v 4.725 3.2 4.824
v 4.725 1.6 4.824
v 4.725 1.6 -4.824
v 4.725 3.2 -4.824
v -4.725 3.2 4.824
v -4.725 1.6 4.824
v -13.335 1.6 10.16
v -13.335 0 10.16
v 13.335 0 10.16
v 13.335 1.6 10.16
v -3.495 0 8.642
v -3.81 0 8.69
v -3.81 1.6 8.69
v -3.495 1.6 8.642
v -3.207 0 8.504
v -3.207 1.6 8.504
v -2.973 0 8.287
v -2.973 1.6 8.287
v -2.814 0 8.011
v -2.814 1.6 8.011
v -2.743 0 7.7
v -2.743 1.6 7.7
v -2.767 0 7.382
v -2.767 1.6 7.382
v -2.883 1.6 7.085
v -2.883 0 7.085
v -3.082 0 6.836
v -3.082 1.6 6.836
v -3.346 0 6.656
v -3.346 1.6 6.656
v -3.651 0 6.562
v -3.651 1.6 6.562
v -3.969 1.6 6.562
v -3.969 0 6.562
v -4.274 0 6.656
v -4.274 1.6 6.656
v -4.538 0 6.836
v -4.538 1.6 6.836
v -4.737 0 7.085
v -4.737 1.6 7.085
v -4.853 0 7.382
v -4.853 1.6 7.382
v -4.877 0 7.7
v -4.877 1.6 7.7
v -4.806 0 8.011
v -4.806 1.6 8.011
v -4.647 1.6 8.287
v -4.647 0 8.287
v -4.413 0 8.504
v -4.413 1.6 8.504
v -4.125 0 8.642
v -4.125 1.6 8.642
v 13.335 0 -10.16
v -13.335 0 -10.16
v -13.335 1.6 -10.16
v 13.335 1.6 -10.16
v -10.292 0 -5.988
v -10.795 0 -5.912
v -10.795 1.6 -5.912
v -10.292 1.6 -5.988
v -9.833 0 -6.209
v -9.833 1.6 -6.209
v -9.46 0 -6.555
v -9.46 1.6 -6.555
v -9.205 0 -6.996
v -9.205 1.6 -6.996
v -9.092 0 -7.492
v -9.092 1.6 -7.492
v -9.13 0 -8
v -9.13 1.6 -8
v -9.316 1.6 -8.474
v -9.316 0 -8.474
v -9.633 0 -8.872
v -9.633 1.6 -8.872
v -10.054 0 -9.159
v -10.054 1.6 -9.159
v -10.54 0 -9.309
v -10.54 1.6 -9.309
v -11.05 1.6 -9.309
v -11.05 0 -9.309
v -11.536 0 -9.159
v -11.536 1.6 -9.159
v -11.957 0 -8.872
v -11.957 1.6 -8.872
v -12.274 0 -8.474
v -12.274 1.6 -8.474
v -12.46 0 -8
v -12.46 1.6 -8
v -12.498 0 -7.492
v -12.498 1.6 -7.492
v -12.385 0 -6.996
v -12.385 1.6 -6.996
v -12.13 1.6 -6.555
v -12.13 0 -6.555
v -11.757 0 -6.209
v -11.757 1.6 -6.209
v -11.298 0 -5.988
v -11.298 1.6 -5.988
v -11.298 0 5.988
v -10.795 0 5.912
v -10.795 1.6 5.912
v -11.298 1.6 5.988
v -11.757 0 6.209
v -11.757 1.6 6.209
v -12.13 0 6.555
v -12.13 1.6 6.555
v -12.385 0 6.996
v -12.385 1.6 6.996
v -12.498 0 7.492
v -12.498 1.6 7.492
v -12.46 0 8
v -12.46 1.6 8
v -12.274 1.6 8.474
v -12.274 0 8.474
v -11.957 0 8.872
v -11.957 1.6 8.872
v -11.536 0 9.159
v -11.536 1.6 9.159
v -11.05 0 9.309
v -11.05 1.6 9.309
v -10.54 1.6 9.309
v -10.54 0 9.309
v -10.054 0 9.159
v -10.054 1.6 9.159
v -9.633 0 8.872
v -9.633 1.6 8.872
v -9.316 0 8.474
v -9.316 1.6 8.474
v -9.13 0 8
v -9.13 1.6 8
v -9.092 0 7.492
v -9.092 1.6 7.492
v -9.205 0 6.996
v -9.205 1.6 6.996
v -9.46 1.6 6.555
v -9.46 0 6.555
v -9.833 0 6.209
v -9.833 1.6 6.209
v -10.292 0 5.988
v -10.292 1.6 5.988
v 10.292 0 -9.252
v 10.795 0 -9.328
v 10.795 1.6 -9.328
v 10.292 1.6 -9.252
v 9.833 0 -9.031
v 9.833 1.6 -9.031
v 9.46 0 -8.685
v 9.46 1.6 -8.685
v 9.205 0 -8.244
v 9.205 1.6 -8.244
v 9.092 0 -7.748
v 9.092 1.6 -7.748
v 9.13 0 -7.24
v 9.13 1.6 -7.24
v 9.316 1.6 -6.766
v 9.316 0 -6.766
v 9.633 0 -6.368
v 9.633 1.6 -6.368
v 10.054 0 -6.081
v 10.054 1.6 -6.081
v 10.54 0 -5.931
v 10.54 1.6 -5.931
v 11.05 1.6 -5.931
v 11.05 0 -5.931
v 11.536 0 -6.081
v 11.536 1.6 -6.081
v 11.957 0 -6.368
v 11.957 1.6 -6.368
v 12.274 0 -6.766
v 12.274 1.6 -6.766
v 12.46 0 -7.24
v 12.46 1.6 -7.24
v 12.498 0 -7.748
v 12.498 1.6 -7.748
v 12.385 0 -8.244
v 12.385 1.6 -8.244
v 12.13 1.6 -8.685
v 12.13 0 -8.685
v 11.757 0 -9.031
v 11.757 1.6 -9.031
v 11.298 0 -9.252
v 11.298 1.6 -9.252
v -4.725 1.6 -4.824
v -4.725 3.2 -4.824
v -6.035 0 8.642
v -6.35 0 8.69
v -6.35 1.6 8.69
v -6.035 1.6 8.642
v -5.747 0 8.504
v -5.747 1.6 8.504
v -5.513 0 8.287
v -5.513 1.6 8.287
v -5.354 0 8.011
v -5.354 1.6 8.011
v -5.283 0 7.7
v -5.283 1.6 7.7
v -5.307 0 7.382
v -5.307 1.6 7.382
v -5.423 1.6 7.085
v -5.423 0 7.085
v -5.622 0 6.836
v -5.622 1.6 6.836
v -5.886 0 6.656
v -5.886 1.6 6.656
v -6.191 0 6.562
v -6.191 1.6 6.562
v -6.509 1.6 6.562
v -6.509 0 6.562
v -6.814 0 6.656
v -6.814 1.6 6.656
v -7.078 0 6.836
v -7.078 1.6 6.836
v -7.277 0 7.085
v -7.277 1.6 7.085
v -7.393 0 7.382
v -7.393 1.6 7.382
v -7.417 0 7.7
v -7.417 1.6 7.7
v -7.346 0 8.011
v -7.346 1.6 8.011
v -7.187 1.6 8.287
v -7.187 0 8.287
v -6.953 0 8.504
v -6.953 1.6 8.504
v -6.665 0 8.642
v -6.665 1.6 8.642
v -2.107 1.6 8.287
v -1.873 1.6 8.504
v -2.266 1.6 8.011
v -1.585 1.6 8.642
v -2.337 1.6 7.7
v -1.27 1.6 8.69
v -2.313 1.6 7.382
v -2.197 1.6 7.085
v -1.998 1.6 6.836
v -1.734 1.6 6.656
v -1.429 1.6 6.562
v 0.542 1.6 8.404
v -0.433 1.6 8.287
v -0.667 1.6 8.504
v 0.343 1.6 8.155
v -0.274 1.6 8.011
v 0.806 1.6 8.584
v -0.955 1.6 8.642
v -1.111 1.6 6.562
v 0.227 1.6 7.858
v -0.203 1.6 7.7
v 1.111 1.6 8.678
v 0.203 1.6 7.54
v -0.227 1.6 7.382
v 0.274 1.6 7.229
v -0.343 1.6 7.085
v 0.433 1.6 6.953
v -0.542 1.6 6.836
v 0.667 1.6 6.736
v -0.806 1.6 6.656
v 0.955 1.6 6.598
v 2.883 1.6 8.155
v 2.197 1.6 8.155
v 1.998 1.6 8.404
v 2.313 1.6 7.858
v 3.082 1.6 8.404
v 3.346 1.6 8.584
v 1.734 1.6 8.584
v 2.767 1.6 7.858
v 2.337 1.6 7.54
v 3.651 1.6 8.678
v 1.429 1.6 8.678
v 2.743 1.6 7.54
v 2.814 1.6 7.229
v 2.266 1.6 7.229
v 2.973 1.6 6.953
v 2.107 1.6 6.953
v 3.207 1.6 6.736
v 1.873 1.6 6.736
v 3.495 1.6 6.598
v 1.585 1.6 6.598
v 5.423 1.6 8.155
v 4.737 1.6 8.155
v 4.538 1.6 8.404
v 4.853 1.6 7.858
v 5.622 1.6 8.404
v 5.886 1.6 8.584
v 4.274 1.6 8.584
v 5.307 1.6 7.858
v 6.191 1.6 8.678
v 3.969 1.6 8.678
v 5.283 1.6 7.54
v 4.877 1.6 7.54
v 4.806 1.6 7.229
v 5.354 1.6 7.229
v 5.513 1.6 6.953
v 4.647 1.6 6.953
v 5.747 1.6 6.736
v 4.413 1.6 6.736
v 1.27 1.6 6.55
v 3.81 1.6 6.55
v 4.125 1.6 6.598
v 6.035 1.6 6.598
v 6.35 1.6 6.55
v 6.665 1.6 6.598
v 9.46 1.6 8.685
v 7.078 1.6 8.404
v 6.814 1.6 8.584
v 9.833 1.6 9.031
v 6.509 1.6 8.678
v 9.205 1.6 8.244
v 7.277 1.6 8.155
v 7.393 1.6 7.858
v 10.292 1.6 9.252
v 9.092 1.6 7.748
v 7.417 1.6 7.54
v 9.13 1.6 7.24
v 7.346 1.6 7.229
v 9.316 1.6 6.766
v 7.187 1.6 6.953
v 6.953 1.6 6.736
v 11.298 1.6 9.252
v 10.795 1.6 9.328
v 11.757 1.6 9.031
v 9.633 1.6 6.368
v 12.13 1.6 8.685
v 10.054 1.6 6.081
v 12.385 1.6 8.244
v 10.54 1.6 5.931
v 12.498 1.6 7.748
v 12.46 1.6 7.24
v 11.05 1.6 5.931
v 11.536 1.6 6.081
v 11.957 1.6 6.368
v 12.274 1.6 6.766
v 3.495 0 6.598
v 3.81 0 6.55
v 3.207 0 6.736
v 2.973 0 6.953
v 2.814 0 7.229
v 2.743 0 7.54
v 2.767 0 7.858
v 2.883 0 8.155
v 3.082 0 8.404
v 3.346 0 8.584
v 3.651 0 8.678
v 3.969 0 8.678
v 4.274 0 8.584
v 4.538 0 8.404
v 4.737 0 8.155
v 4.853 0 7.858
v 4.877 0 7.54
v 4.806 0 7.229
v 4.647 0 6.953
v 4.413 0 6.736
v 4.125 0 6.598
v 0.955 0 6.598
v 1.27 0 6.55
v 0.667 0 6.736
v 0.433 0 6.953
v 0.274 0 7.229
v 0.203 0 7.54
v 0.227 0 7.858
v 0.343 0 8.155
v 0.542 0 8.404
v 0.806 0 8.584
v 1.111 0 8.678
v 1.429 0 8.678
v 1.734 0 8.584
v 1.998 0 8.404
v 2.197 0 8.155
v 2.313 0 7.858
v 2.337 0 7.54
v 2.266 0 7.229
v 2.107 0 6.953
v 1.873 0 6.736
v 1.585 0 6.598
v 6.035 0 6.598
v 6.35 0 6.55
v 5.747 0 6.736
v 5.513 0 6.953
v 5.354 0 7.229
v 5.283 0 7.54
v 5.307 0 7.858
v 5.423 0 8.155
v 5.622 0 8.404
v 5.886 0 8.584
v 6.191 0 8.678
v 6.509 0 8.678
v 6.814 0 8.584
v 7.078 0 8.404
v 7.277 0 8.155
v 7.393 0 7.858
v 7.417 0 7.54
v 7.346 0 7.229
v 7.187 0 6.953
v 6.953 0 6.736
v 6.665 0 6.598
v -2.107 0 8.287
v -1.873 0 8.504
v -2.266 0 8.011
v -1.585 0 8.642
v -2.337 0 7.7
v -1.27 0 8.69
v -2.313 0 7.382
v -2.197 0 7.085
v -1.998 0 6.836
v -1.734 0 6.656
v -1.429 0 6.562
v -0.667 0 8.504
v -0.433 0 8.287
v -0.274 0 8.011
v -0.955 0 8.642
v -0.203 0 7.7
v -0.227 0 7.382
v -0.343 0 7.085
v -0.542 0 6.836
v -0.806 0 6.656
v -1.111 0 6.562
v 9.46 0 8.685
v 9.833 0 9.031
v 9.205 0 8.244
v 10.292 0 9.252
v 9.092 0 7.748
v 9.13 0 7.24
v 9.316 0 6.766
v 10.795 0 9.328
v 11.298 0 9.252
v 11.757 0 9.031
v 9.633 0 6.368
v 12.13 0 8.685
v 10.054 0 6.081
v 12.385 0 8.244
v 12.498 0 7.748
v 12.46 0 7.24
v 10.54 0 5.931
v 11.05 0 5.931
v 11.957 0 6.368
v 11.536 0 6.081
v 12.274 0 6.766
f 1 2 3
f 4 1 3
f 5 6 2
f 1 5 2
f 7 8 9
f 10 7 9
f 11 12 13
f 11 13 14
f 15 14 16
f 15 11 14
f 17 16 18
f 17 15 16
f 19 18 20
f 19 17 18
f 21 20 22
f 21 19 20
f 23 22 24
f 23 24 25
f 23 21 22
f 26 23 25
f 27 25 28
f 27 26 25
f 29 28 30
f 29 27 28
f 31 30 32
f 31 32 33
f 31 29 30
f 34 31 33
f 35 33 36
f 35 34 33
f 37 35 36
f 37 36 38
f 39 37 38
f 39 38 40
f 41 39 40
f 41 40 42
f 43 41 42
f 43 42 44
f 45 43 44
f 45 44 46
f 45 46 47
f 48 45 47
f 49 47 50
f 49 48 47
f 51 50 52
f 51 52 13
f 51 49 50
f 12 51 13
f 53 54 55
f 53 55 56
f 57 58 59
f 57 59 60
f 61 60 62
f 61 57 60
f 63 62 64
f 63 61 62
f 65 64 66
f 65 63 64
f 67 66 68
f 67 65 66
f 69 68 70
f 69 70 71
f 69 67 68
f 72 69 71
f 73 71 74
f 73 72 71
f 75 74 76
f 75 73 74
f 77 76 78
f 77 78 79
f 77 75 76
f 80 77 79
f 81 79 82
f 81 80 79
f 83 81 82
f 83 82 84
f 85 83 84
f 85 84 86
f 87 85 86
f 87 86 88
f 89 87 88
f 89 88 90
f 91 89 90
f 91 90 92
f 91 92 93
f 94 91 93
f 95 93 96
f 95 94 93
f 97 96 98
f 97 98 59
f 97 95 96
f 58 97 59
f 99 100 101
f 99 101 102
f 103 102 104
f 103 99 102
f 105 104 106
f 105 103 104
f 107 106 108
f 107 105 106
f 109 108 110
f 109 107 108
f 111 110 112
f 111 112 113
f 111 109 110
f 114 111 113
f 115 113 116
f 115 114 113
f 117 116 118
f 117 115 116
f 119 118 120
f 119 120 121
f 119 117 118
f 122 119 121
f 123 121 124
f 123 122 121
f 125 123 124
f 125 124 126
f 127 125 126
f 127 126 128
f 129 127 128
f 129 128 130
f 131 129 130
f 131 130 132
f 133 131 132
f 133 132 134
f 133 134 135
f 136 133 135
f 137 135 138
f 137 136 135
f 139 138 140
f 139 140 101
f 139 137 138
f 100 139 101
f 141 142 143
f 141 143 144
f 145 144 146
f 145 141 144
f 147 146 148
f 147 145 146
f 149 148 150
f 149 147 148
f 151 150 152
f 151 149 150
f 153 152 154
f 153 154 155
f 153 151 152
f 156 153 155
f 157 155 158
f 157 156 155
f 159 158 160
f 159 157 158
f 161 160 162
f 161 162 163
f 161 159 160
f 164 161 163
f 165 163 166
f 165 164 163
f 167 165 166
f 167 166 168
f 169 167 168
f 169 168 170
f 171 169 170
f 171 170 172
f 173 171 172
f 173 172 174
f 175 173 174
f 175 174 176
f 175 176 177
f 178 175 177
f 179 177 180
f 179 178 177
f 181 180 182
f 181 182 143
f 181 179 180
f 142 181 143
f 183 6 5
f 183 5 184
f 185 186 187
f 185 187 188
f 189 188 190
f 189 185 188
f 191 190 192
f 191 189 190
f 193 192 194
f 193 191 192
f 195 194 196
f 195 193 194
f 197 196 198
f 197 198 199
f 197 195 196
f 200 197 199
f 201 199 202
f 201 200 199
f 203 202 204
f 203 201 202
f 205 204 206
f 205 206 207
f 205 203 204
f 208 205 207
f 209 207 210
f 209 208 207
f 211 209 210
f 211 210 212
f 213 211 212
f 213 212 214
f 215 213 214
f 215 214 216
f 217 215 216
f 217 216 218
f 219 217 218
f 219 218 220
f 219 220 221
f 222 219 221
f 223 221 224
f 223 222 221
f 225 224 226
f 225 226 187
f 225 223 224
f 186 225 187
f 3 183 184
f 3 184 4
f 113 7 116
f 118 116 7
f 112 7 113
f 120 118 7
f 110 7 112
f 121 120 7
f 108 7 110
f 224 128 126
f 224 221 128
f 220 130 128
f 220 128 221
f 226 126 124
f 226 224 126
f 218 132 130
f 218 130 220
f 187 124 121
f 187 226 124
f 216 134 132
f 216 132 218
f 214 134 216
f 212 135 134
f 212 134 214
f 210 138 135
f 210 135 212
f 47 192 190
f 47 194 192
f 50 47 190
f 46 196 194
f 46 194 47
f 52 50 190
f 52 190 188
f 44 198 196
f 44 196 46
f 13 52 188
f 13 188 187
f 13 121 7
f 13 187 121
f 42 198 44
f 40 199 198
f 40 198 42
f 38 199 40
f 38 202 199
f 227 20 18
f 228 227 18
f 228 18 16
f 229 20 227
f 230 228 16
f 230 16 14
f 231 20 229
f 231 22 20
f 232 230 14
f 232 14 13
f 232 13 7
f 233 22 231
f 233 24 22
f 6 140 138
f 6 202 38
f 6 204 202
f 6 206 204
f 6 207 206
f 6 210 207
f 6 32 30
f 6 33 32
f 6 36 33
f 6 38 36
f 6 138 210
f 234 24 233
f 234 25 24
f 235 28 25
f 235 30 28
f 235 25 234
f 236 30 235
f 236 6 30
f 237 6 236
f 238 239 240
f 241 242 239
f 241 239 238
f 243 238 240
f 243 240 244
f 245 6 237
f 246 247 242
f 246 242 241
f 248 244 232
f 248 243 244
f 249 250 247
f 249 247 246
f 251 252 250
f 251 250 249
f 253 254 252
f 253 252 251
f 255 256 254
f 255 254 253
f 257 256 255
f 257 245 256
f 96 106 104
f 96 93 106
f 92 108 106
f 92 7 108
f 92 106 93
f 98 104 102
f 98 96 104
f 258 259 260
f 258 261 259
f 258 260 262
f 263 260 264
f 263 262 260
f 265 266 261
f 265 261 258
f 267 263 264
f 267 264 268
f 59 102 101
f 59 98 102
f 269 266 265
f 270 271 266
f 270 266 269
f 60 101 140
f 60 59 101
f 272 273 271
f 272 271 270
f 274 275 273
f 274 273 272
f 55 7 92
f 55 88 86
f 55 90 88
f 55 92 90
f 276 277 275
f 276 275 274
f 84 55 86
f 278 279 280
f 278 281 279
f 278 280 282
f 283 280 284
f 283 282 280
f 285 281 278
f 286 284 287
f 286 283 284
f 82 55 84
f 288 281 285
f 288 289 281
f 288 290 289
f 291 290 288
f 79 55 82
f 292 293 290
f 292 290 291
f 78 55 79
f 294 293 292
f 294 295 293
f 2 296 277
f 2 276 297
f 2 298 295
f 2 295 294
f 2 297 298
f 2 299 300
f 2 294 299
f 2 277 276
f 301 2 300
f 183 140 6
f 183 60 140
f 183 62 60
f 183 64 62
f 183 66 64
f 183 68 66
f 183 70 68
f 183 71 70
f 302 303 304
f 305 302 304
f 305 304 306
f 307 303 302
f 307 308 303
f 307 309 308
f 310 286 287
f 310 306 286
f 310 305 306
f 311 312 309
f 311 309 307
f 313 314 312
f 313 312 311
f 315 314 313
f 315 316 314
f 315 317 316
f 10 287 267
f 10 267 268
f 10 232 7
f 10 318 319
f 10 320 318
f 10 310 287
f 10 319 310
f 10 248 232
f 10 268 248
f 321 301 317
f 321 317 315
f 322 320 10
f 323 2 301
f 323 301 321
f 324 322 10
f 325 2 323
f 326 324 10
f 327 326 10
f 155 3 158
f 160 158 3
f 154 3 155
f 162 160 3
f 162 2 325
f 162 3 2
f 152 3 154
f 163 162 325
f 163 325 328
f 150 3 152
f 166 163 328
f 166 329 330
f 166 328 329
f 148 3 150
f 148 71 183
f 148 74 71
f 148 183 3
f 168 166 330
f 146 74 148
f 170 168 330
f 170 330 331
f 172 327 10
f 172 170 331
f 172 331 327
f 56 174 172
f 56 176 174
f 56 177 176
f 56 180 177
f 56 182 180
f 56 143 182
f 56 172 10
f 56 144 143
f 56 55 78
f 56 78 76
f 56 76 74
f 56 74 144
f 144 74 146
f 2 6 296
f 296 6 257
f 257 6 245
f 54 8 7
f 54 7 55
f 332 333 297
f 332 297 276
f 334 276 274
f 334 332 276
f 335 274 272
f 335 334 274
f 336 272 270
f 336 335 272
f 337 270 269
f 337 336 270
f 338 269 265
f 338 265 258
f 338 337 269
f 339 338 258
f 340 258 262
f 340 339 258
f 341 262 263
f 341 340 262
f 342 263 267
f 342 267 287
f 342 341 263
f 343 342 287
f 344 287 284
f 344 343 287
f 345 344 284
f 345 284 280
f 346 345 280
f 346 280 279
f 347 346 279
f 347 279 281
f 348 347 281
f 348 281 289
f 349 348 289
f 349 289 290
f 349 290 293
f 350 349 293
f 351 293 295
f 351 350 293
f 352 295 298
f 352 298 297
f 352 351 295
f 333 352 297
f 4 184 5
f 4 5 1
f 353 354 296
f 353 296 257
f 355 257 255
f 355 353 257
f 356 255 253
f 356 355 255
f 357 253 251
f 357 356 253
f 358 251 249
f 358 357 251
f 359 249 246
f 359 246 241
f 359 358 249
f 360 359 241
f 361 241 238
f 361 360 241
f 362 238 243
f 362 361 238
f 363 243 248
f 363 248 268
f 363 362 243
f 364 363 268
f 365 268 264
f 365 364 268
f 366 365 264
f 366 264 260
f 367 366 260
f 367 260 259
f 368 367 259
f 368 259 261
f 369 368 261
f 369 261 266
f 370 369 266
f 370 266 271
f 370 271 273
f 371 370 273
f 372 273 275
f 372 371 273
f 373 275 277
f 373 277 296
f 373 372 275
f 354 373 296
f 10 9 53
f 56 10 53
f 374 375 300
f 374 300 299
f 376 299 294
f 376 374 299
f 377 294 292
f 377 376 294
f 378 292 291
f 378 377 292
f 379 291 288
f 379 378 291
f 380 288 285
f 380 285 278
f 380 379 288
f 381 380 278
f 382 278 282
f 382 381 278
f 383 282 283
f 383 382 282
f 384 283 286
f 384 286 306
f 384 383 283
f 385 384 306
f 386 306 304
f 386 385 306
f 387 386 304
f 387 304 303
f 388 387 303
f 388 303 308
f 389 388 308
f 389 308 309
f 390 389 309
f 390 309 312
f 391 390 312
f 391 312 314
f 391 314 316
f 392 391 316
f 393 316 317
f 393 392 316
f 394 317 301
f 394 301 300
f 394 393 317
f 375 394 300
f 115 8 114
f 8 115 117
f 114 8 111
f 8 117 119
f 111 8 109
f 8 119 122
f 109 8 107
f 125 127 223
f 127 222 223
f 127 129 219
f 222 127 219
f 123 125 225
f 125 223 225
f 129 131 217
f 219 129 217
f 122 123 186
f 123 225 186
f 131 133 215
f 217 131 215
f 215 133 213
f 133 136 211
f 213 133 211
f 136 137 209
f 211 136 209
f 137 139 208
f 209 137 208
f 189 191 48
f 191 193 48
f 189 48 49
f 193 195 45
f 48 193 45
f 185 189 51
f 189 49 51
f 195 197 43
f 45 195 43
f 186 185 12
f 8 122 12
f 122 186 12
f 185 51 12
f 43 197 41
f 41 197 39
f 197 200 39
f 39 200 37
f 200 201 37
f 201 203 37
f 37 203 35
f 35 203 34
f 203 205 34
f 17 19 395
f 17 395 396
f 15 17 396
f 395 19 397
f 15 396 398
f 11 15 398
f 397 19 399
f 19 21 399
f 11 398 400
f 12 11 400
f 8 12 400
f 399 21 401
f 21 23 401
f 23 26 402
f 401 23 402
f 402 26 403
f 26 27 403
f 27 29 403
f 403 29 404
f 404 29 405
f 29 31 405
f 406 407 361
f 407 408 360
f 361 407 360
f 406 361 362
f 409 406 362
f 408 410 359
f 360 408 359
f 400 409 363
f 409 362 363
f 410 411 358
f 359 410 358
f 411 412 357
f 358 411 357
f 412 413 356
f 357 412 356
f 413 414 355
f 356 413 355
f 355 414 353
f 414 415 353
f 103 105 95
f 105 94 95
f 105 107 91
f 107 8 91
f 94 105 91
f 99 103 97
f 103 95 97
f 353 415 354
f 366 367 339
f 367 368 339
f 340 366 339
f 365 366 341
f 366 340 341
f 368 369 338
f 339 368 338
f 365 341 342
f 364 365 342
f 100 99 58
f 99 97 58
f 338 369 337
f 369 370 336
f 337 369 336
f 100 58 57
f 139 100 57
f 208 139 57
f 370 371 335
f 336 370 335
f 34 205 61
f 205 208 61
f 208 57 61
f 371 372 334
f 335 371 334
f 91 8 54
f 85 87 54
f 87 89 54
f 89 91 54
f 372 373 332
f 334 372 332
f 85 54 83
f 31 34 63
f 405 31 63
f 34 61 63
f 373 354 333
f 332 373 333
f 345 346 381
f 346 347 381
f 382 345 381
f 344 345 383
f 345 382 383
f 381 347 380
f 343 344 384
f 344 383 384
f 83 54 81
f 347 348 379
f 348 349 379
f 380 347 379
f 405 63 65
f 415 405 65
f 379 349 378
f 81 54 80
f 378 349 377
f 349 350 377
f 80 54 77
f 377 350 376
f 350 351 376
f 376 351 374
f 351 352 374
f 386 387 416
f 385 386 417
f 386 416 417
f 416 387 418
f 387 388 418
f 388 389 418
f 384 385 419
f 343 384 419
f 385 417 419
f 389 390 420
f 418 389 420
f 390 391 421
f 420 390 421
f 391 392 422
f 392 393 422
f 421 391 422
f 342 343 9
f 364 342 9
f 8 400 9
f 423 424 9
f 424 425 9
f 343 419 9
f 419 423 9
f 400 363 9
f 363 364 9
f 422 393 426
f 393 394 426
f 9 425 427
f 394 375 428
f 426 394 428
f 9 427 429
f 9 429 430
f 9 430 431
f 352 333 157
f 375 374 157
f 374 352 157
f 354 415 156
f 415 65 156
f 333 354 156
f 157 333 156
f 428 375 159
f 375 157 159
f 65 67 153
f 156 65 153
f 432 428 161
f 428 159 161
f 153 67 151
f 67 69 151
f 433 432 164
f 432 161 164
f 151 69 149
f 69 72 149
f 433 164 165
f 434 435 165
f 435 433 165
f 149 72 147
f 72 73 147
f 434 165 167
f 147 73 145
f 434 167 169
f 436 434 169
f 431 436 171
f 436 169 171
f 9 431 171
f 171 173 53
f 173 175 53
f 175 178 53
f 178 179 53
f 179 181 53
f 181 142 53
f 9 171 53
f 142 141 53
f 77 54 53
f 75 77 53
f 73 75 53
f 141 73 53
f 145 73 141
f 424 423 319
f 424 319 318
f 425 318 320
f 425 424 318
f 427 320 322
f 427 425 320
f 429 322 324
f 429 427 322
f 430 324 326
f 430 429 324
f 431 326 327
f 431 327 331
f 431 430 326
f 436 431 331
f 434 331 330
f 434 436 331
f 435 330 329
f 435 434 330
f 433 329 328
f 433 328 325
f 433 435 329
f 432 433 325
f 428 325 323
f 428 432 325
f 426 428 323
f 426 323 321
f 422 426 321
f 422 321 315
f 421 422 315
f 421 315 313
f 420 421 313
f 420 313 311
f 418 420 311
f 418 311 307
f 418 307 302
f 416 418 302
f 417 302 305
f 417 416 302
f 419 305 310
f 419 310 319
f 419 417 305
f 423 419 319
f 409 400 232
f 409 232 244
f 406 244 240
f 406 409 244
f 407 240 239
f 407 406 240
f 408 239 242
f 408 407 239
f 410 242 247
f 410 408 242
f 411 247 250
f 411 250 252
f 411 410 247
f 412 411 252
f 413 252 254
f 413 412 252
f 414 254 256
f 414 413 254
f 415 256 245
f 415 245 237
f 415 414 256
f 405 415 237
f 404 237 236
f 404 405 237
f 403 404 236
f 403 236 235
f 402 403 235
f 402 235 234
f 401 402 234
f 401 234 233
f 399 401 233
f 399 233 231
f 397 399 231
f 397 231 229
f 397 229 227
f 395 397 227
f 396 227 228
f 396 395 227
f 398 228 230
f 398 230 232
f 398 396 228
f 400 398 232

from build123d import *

# Parameters (mm, degrees)
SKETCH1_W           = 26.67
SKETCH1_H           = 20.32
SKETCH1_R           = 1.707818092
SKETCH1_R_2         = 1.06997981
BOSS_EXTRUDE1_DEPTH = 1.6
SKETCH2_W           = 9.449727346
SKETCH2_H           = 9.64726846
BOSS_EXTRUDE2_DEPTH = 1.6


with BuildPart() as part:
    # Sketch1 → Boss-Extrude1 (new body)
    with BuildSketch(Plane(origin=(0, 0, 0), x_dir=(1, 0, 0), z_dir=(0, 1, 0))):
        Rectangle(SKETCH1_W, SKETCH1_H)
        with Locations(Location((-10.795, 7.62, 0), (0, 0, 270))):
            Circle(SKETCH1_R, mode=Mode.SUBTRACT)
        with Locations(Location((10.795, 7.62, 0), (0, 0, 90))):
            Circle(SKETCH1_R, mode=Mode.SUBTRACT)
        with Locations(Location((10.795, -7.62, 0), (0, 0, 270))):
            Circle(SKETCH1_R, mode=Mode.SUBTRACT)
        with Locations(Location((-10.795, -7.62, 0), (0, 0, 90))):
            Circle(SKETCH1_R, mode=Mode.SUBTRACT)
        with Locations(Location((-1.27, -7.62, 0), (0, 0, 270))):
            Circle(SKETCH1_R_2, mode=Mode.SUBTRACT)
        with Locations(Location((-3.81, -7.62, 0), (0, 0, 270))):
            Circle(SKETCH1_R_2, mode=Mode.SUBTRACT)
        with Locations(Location((-6.35, -7.62, 0), (0, 0, 270))):
            Circle(SKETCH1_R_2, mode=Mode.SUBTRACT)
        with Locations(Location((6.35, -7.62, 0), (0, 0, 90))):
            Circle(SKETCH1_R_2, mode=Mode.SUBTRACT)
        with Locations(Location((3.81, -7.62, 0), (0, 0, 90))):
            Circle(SKETCH1_R_2, mode=Mode.SUBTRACT)
        with Locations(Location((1.27, -7.62, 0), (0, 0, 90))):
            Circle(SKETCH1_R_2, mode=Mode.SUBTRACT)
    extrude(amount=BOSS_EXTRUDE1_DEPTH)

    # Sketch2 → Boss-Extrude2 (add)
    with BuildSketch(Plane(origin=(0, 1.6, 0), x_dir=(1, 0, 0), z_dir=(0, 1, 0))):
        Rectangle(SKETCH2_W, SKETCH2_H)
    extrude(amount=BOSS_EXTRUDE2_DEPTH)


solid = part.part
